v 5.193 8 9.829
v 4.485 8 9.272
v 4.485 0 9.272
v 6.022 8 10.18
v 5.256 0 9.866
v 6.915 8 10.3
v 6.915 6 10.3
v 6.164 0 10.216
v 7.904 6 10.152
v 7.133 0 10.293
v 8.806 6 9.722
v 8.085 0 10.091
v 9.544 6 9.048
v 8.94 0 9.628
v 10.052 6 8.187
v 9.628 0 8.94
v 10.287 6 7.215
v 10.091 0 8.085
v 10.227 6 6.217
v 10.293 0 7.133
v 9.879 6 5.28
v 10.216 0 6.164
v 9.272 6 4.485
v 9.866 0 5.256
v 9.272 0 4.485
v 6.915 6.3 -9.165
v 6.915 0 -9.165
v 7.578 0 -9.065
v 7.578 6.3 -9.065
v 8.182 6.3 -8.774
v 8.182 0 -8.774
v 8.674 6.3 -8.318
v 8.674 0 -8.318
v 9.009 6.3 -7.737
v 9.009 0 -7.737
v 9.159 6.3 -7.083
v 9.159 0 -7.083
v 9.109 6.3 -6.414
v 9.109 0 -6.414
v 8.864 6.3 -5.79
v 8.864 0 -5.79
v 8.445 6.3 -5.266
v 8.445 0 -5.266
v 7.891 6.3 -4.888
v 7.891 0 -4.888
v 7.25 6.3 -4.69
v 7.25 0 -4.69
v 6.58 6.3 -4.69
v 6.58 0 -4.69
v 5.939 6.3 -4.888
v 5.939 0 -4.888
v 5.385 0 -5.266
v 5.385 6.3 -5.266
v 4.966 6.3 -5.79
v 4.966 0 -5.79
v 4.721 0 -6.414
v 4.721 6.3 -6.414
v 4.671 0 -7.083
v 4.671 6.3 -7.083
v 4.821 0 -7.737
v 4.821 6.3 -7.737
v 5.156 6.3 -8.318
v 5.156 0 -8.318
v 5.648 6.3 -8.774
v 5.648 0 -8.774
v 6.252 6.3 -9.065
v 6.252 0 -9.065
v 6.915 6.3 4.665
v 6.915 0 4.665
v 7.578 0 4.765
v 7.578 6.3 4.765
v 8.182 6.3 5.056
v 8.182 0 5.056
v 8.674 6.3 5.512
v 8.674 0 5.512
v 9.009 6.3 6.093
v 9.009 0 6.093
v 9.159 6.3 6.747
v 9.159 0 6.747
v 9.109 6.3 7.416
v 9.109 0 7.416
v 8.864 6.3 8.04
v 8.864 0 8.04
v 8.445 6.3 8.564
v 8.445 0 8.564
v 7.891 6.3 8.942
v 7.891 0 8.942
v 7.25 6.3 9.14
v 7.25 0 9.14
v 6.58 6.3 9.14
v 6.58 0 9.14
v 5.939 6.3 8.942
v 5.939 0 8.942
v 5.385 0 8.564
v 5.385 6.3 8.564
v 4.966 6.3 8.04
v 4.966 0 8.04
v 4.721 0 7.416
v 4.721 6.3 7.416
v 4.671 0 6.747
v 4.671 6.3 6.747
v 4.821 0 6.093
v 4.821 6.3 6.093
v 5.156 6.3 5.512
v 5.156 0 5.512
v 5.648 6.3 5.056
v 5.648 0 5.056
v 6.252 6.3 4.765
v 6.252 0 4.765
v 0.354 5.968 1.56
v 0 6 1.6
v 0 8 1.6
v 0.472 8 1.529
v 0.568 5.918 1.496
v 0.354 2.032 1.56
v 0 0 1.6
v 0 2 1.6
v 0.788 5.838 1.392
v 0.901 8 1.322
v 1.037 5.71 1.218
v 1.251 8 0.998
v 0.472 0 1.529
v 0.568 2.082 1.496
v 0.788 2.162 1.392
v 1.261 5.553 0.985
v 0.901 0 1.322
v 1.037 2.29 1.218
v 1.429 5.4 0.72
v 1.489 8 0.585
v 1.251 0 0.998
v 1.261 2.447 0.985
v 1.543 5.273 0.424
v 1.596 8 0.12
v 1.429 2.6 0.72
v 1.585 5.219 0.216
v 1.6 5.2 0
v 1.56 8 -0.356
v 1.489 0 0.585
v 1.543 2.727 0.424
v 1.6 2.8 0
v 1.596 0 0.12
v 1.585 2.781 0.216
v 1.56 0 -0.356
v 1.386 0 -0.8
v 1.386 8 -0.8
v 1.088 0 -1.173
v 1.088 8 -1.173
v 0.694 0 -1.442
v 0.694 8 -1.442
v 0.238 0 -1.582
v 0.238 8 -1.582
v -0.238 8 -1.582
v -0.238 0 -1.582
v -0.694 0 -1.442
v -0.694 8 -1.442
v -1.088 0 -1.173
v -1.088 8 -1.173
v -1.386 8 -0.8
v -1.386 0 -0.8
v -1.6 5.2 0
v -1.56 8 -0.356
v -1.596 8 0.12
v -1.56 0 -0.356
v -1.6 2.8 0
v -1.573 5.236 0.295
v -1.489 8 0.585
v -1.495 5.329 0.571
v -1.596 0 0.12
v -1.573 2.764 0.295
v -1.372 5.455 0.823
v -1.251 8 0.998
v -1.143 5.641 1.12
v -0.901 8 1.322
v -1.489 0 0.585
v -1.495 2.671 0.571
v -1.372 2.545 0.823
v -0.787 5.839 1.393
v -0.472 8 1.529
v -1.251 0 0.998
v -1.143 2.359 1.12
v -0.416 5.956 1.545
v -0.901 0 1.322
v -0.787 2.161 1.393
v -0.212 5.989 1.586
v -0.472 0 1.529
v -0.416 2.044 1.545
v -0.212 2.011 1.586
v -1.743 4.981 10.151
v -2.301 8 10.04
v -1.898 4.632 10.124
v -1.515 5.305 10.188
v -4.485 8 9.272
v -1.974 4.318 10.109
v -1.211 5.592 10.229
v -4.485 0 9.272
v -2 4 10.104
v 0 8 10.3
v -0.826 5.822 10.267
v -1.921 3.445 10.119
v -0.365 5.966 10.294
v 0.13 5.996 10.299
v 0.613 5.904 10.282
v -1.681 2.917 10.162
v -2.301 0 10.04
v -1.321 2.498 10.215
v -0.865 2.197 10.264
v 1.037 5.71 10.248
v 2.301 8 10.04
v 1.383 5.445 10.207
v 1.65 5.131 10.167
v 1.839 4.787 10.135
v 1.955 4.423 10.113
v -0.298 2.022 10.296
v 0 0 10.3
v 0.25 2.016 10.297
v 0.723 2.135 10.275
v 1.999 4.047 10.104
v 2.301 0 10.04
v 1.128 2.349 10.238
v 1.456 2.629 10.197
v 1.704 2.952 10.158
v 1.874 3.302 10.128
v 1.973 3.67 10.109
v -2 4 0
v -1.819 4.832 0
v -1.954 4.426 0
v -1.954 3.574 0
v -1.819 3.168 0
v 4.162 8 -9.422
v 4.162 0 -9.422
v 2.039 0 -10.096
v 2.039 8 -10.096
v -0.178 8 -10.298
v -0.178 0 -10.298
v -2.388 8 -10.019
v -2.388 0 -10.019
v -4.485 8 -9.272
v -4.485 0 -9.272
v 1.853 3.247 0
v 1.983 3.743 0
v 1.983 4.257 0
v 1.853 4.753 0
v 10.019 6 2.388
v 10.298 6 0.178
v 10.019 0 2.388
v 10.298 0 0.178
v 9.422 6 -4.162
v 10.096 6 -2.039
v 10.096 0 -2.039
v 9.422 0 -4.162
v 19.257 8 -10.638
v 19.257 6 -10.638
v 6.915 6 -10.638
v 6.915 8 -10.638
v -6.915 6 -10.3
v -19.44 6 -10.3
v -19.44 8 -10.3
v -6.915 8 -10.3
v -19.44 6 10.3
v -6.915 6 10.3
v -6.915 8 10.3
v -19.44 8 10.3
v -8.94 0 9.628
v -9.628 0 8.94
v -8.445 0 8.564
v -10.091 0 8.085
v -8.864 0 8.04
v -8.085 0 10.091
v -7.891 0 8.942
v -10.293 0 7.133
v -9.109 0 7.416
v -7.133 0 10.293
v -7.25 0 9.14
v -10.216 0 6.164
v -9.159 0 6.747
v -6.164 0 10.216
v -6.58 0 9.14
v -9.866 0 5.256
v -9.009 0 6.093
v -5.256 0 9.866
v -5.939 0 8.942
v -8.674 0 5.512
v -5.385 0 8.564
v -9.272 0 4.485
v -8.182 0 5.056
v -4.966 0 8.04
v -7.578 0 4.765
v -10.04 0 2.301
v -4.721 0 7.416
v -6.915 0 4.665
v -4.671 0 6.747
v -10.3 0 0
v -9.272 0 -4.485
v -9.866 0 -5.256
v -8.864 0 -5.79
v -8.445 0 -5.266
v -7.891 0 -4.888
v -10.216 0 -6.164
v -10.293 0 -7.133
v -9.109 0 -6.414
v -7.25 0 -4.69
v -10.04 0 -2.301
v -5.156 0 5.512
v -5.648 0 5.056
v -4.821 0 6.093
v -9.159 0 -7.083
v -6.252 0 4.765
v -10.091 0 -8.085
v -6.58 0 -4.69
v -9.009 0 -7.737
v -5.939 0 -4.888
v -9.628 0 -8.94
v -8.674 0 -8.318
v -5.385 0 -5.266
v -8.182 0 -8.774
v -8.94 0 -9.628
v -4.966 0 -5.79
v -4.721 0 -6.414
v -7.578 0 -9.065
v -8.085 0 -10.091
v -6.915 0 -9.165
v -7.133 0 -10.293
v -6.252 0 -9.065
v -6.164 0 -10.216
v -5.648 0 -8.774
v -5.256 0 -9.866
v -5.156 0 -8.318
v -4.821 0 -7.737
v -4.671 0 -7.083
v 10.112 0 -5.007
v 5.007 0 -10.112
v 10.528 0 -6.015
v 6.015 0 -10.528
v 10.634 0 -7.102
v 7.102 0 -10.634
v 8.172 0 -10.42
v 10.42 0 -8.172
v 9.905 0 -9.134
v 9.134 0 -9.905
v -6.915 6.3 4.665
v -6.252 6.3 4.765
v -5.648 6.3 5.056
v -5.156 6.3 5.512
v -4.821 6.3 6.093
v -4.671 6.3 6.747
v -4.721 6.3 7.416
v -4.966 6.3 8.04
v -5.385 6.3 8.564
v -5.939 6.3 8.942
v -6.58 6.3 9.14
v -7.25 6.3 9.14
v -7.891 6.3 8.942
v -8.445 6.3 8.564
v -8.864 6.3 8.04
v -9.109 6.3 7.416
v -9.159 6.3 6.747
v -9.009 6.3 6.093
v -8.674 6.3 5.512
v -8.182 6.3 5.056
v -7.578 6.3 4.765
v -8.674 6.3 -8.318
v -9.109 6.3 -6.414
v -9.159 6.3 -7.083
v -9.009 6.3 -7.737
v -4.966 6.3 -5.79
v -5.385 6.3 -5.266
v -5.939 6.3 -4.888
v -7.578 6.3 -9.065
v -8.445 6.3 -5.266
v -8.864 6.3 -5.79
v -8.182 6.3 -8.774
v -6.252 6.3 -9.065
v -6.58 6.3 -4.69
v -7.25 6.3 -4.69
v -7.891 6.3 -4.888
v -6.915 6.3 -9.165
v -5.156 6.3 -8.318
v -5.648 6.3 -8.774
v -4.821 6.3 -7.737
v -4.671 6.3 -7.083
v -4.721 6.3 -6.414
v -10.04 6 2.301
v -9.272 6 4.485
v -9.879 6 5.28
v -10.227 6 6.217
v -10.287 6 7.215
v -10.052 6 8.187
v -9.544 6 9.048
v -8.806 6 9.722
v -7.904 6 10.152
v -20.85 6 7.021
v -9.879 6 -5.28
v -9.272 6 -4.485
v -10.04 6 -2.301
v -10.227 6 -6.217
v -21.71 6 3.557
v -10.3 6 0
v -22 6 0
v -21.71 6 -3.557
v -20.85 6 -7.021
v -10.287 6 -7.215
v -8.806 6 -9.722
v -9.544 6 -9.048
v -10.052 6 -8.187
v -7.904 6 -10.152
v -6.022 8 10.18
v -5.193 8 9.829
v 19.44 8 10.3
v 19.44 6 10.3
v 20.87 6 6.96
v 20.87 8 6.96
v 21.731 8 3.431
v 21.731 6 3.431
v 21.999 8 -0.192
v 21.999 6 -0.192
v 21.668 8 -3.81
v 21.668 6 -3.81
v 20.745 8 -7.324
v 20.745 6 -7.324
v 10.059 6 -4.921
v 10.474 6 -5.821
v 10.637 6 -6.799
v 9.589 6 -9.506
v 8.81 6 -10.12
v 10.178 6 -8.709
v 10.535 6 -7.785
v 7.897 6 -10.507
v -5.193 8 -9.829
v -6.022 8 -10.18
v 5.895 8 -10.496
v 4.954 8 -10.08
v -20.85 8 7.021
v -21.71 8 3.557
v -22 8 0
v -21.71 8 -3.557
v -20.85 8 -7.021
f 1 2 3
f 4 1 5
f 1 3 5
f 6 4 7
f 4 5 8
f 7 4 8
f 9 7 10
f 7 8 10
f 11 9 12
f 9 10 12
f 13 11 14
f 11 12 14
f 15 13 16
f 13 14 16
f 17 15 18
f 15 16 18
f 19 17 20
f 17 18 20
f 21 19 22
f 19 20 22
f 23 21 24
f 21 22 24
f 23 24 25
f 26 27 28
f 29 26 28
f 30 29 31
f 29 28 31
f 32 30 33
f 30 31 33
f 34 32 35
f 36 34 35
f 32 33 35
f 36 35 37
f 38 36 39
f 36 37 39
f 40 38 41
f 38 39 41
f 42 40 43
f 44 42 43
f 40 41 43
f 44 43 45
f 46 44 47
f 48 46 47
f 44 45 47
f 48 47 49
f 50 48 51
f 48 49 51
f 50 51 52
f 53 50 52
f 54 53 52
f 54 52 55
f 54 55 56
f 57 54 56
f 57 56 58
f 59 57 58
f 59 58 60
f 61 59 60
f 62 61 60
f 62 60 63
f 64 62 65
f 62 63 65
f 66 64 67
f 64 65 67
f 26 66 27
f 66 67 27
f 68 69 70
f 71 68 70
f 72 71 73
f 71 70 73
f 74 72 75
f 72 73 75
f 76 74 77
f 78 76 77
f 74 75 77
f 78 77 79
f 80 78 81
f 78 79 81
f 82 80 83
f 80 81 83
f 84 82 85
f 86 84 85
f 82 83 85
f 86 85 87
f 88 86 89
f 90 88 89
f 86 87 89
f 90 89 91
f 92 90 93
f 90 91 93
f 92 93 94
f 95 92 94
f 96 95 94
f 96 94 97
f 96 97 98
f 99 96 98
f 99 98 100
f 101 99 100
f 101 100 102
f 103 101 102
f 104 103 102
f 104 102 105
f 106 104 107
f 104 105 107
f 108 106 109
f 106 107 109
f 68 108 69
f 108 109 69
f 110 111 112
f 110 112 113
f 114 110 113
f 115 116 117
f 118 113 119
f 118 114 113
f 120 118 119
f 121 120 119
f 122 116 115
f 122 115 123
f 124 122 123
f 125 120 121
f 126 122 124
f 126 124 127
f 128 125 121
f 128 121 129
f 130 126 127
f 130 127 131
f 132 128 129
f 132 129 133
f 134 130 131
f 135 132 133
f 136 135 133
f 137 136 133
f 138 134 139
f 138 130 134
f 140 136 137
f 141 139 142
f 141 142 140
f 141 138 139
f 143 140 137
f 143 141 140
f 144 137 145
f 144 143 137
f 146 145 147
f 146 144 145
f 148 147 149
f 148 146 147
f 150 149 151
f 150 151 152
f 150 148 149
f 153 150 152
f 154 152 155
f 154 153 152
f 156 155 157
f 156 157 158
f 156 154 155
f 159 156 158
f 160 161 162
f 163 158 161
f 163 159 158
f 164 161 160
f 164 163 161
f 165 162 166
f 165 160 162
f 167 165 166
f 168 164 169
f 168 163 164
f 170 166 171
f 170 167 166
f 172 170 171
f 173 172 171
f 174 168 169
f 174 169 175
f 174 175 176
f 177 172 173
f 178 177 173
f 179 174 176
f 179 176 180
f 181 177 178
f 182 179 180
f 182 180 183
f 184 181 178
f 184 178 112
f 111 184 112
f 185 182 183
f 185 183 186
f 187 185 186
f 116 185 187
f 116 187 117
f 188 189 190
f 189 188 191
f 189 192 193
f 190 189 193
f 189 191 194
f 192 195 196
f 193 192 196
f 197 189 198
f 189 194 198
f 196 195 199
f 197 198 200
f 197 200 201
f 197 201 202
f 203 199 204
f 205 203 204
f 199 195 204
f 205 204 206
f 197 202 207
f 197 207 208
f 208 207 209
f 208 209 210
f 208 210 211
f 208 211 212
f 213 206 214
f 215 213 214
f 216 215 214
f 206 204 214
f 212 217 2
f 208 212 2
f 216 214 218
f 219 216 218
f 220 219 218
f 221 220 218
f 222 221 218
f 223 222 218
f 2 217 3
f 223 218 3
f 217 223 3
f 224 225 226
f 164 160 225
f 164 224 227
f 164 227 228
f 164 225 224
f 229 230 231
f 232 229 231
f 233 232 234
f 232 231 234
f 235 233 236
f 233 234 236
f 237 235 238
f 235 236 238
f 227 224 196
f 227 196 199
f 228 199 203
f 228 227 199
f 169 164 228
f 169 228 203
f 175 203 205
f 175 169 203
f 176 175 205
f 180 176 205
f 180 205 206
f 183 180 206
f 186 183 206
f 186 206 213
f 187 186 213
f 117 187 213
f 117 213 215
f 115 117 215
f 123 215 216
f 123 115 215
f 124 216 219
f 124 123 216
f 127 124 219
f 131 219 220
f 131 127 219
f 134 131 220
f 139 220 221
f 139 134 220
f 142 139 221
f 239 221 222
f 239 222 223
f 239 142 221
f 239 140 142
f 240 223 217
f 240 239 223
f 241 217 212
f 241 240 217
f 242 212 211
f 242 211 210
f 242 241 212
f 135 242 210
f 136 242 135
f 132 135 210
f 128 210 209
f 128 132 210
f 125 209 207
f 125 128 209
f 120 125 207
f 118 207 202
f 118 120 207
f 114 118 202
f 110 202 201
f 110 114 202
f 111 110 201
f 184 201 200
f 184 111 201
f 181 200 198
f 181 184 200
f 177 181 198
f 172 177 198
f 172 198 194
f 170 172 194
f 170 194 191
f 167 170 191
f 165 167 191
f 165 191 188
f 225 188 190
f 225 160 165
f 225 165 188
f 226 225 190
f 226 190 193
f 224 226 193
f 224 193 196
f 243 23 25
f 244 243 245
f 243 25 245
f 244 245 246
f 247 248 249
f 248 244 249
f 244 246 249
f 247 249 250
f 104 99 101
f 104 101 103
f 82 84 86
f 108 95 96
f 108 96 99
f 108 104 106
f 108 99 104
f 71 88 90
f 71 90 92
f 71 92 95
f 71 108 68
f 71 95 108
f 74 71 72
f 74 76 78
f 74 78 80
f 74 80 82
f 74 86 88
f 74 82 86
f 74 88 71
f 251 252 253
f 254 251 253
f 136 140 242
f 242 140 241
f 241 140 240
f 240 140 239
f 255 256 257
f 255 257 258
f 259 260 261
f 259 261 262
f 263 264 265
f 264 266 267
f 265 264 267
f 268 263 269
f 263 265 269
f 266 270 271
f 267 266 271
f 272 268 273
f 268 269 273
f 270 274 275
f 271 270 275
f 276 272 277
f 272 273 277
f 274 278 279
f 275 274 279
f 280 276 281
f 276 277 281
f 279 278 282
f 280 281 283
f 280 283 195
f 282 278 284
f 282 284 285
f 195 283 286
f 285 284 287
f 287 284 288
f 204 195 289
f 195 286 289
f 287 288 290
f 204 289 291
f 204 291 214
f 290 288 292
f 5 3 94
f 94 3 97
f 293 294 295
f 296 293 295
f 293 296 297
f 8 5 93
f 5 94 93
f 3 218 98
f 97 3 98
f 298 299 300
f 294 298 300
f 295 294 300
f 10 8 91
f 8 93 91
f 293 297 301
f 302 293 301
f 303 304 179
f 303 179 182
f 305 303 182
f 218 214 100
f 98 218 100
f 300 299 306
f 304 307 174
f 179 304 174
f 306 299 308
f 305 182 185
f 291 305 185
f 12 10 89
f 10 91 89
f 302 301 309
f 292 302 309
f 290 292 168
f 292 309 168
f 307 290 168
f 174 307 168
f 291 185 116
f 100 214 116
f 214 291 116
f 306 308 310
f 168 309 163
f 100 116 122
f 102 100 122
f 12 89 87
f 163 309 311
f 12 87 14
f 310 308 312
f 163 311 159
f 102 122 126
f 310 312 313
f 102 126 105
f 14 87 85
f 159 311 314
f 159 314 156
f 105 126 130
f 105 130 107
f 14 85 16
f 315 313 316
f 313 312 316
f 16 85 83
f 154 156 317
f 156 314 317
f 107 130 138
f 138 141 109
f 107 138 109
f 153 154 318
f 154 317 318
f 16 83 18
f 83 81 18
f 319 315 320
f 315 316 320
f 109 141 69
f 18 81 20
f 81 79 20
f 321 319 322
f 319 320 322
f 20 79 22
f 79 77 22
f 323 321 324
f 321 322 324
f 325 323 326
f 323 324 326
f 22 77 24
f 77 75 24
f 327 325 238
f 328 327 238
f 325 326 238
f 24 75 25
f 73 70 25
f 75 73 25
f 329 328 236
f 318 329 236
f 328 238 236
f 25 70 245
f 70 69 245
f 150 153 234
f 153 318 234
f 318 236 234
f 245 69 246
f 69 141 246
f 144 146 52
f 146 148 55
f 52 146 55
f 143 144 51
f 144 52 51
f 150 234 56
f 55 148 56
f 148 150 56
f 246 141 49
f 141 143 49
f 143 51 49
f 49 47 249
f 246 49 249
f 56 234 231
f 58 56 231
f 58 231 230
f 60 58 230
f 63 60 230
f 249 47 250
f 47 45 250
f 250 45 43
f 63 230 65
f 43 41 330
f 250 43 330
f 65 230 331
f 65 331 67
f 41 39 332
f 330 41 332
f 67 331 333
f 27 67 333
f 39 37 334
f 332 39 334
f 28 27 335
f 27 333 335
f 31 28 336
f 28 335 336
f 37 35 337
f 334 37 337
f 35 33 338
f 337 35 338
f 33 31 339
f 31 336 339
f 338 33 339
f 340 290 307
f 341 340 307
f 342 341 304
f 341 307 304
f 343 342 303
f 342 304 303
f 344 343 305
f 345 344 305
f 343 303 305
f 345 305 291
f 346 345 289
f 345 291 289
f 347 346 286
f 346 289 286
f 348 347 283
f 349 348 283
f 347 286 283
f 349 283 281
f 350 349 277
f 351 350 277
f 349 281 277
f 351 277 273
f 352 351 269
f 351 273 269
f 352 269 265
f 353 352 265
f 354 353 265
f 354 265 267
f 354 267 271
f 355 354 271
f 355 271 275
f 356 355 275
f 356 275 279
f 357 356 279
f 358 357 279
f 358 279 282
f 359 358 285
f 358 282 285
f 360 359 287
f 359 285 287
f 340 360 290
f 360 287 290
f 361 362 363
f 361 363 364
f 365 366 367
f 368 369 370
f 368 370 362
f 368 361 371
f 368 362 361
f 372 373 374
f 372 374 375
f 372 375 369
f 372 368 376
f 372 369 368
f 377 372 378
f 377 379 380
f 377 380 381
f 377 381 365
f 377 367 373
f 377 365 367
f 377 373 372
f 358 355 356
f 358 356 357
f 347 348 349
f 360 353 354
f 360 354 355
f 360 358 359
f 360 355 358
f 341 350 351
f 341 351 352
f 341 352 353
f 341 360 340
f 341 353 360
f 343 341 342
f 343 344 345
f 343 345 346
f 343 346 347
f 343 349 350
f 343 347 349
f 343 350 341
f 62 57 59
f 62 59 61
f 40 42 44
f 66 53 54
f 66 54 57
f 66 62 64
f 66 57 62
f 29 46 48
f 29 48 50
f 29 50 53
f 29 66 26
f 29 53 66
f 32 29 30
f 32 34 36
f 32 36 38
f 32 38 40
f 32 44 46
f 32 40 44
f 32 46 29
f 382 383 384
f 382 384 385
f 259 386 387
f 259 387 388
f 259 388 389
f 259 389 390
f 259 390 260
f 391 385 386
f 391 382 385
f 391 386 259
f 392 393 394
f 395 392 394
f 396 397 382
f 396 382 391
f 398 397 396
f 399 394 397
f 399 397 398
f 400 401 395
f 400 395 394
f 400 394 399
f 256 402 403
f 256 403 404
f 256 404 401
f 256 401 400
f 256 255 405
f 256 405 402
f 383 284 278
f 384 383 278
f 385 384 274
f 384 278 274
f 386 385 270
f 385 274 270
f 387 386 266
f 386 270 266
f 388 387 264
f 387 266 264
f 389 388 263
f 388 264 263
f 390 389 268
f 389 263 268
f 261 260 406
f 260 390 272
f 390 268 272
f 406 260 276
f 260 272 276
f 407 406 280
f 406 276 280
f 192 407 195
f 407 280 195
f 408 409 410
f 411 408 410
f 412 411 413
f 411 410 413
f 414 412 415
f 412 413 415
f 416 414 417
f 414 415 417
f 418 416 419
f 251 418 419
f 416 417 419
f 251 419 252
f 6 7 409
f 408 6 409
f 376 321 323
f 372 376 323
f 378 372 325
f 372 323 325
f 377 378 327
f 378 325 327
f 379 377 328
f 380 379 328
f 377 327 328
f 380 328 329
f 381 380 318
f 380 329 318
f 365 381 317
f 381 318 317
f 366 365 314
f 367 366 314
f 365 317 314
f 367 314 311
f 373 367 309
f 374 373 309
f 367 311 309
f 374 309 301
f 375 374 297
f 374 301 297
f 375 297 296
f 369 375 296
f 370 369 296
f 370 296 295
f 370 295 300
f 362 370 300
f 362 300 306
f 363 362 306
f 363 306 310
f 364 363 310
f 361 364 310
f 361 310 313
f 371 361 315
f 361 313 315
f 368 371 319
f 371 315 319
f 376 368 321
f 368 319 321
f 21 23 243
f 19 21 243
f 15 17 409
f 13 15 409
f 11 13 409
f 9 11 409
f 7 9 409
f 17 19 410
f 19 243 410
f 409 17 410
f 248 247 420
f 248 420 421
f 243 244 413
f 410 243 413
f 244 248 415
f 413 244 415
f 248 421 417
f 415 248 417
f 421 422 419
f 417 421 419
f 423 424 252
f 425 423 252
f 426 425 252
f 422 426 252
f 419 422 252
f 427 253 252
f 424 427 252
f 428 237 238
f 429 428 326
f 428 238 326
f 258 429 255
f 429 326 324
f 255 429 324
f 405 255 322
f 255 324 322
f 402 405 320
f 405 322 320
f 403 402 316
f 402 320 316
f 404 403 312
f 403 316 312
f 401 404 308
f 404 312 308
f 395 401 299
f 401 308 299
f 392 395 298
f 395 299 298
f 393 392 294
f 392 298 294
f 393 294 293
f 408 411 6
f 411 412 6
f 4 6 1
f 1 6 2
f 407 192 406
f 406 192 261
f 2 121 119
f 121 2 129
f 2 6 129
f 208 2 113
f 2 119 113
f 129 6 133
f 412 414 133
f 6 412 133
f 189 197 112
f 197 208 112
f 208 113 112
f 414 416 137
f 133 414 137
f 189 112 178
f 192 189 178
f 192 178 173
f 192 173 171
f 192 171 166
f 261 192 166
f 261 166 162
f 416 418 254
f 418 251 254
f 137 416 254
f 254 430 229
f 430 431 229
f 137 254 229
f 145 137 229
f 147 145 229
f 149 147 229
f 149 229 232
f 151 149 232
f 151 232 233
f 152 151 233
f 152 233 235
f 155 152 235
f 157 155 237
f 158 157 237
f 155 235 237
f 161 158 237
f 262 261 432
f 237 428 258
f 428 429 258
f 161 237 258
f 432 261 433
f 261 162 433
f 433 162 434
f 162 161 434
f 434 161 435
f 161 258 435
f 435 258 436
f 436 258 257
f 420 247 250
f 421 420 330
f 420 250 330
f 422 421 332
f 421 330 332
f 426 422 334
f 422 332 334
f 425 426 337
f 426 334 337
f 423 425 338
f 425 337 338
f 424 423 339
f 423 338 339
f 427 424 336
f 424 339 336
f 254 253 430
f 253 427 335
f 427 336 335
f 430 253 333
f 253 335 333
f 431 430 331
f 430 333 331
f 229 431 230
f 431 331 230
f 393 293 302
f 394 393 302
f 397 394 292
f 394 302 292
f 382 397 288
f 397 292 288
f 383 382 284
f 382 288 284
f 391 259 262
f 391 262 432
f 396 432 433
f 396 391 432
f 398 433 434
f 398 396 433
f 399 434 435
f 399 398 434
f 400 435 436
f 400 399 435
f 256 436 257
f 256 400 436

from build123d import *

# Parameters (mm, degrees)
SKETCH1_R           = 1.6
BOSS_EXTRUDE1_DEPTH = 8
SKETCH3_R           = 2
CUT_EXTRUDE1_DEPTH  = 14.5
BOSS_EXTRUDE3_START = -2
BOSS_EXTRUDE3_DEPTH = 2
SKETCH5_R           = 2.25
CUT_EXTRUDE2_DEPTH  = 6.3


with BuildPart() as part:
    # Sketch1 → Boss-Extrude1 (new body)
    with BuildSketch(Plane(origin=(0, 0, 0), x_dir=(1, 0, 0), z_dir=(0, 1, 0))):
        with BuildLine():
            ThreePointArc((-9.272031939, -4.485468061), (-9.308556454, -9.308556454), (-4.485468061, -9.272031939))
            ThreePointArc((-4.485468061, -9.272031939), (0, -10.3), (4.485468061, -9.272031939))
            ThreePointArc((4.485468061, -9.272031939), (9.308556454, -9.308556454), (9.272031939, -4.485468061))
            ThreePointArc((9.272031939, -4.485468061), (10.298455819, -0.178347233), (9.421782939, 4.161731161))
            ThreePointArc((9.421782939, 4.161731161), (9.547911886, 9.547911886), (4.161731161, 9.421782939))
            ThreePointArc((4.161731161, 9.421782939), (-0.178347233, 10.298455819), (-4.485468061, 9.272031939))
            ThreePointArc((-4.485468061, 9.272031939), (-9.308556454, 9.308556454), (-9.272031939, 4.485468061))
            ThreePointArc((-9.272031939, 4.485468061), (-10.3, 0), (-9.272031939, -4.485468061))
        make_face()
        with Locations(Location((0, 0, 0), (0, 0, 270))):
            Circle(SKETCH1_R, mode=Mode.SUBTRACT)
    extrude(amount=BOSS_EXTRUDE1_DEPTH)

    # Sketch3 → Cut-Extrude1 (cut)
    with BuildSketch(Plane.XY):
        with Locations(Location((0, 4, 0), (0, 0, 180))):
            Circle(SKETCH3_R)
    extrude(amount=CUT_EXTRUDE1_DEPTH, mode=Mode.SUBTRACT)

    # Sketch4 → Boss-Extrude3 (add)
    with BuildSketch(Plane(origin=(0, 8, 0), x_dir=(1, 0, 0), z_dir=(0, 1, 0)).offset(BOSS_EXTRUDE3_START)):
        with BuildLine():
            Line((-19.439907407, 10.3), (-6.915, 10.3))
            ThreePointArc((-6.915, 10.3), (-10.052052009, 8.186664144), (-9.272031939, 4.485468061))
            ThreePointArc((-9.272031939, 4.485468061), (-10.3, 0), (-9.272031939, -4.485468061))
            ThreePointArc((-9.272031939, -4.485468061), (-10.052052009, -8.186664144), (-6.915, -10.3))
            Line((-6.915, -10.3), (-19.439907407, -10.3))
            ThreePointArc((-19.439907407, -10.3), (-22, 0), (-19.439907407, 10.3))
        make_face()
        with BuildLine():
            Line((19.256747497, 10.638499698), (6.915, 10.638499698))
            ThreePointArc((6.915, 10.638499698), (10.387480791, 8.25899671), (9.421782939, 4.161731161))
            ThreePointArc((9.421782939, 4.161731161), (10.298455819, -0.178347233), (9.272031939, -4.485468061))
            ThreePointArc((9.272031939, -4.485468061), (10.052052009, -8.186664144), (6.915, -10.3))
            Line((6.915, -10.3), (19.439907407, -10.3))
            ThreePointArc((19.439907407, -10.3), (21.999158338, 0.192438041), (19.256747497, 10.638499698))
        make_face()
    extrude(amount=BOSS_EXTRUDE3_DEPTH)

    # Sketch5 → Cut-Extrude2 (cut)
    with BuildSketch(Plane.XZ):
        with Locations(Location((-6.915, 6.915, 0), (0, 0, 270))):
            Circle(SKETCH5_R)
        with Locations(Location((6.915, 6.915, 0), (0, 0, 270))):
            Circle(SKETCH5_R)
        with Locations(Location((6.915, -6.915, 0), (0, 0, 270))):
            Circle(SKETCH5_R)
        with Locations(Location((-6.915, -6.915, 0), (0, 0, 270))):
            Circle(SKETCH5_R)
    extrude(amount=-CUT_EXTRUDE2_DEPTH, mode=Mode.SUBTRACT)


solid = part.part
